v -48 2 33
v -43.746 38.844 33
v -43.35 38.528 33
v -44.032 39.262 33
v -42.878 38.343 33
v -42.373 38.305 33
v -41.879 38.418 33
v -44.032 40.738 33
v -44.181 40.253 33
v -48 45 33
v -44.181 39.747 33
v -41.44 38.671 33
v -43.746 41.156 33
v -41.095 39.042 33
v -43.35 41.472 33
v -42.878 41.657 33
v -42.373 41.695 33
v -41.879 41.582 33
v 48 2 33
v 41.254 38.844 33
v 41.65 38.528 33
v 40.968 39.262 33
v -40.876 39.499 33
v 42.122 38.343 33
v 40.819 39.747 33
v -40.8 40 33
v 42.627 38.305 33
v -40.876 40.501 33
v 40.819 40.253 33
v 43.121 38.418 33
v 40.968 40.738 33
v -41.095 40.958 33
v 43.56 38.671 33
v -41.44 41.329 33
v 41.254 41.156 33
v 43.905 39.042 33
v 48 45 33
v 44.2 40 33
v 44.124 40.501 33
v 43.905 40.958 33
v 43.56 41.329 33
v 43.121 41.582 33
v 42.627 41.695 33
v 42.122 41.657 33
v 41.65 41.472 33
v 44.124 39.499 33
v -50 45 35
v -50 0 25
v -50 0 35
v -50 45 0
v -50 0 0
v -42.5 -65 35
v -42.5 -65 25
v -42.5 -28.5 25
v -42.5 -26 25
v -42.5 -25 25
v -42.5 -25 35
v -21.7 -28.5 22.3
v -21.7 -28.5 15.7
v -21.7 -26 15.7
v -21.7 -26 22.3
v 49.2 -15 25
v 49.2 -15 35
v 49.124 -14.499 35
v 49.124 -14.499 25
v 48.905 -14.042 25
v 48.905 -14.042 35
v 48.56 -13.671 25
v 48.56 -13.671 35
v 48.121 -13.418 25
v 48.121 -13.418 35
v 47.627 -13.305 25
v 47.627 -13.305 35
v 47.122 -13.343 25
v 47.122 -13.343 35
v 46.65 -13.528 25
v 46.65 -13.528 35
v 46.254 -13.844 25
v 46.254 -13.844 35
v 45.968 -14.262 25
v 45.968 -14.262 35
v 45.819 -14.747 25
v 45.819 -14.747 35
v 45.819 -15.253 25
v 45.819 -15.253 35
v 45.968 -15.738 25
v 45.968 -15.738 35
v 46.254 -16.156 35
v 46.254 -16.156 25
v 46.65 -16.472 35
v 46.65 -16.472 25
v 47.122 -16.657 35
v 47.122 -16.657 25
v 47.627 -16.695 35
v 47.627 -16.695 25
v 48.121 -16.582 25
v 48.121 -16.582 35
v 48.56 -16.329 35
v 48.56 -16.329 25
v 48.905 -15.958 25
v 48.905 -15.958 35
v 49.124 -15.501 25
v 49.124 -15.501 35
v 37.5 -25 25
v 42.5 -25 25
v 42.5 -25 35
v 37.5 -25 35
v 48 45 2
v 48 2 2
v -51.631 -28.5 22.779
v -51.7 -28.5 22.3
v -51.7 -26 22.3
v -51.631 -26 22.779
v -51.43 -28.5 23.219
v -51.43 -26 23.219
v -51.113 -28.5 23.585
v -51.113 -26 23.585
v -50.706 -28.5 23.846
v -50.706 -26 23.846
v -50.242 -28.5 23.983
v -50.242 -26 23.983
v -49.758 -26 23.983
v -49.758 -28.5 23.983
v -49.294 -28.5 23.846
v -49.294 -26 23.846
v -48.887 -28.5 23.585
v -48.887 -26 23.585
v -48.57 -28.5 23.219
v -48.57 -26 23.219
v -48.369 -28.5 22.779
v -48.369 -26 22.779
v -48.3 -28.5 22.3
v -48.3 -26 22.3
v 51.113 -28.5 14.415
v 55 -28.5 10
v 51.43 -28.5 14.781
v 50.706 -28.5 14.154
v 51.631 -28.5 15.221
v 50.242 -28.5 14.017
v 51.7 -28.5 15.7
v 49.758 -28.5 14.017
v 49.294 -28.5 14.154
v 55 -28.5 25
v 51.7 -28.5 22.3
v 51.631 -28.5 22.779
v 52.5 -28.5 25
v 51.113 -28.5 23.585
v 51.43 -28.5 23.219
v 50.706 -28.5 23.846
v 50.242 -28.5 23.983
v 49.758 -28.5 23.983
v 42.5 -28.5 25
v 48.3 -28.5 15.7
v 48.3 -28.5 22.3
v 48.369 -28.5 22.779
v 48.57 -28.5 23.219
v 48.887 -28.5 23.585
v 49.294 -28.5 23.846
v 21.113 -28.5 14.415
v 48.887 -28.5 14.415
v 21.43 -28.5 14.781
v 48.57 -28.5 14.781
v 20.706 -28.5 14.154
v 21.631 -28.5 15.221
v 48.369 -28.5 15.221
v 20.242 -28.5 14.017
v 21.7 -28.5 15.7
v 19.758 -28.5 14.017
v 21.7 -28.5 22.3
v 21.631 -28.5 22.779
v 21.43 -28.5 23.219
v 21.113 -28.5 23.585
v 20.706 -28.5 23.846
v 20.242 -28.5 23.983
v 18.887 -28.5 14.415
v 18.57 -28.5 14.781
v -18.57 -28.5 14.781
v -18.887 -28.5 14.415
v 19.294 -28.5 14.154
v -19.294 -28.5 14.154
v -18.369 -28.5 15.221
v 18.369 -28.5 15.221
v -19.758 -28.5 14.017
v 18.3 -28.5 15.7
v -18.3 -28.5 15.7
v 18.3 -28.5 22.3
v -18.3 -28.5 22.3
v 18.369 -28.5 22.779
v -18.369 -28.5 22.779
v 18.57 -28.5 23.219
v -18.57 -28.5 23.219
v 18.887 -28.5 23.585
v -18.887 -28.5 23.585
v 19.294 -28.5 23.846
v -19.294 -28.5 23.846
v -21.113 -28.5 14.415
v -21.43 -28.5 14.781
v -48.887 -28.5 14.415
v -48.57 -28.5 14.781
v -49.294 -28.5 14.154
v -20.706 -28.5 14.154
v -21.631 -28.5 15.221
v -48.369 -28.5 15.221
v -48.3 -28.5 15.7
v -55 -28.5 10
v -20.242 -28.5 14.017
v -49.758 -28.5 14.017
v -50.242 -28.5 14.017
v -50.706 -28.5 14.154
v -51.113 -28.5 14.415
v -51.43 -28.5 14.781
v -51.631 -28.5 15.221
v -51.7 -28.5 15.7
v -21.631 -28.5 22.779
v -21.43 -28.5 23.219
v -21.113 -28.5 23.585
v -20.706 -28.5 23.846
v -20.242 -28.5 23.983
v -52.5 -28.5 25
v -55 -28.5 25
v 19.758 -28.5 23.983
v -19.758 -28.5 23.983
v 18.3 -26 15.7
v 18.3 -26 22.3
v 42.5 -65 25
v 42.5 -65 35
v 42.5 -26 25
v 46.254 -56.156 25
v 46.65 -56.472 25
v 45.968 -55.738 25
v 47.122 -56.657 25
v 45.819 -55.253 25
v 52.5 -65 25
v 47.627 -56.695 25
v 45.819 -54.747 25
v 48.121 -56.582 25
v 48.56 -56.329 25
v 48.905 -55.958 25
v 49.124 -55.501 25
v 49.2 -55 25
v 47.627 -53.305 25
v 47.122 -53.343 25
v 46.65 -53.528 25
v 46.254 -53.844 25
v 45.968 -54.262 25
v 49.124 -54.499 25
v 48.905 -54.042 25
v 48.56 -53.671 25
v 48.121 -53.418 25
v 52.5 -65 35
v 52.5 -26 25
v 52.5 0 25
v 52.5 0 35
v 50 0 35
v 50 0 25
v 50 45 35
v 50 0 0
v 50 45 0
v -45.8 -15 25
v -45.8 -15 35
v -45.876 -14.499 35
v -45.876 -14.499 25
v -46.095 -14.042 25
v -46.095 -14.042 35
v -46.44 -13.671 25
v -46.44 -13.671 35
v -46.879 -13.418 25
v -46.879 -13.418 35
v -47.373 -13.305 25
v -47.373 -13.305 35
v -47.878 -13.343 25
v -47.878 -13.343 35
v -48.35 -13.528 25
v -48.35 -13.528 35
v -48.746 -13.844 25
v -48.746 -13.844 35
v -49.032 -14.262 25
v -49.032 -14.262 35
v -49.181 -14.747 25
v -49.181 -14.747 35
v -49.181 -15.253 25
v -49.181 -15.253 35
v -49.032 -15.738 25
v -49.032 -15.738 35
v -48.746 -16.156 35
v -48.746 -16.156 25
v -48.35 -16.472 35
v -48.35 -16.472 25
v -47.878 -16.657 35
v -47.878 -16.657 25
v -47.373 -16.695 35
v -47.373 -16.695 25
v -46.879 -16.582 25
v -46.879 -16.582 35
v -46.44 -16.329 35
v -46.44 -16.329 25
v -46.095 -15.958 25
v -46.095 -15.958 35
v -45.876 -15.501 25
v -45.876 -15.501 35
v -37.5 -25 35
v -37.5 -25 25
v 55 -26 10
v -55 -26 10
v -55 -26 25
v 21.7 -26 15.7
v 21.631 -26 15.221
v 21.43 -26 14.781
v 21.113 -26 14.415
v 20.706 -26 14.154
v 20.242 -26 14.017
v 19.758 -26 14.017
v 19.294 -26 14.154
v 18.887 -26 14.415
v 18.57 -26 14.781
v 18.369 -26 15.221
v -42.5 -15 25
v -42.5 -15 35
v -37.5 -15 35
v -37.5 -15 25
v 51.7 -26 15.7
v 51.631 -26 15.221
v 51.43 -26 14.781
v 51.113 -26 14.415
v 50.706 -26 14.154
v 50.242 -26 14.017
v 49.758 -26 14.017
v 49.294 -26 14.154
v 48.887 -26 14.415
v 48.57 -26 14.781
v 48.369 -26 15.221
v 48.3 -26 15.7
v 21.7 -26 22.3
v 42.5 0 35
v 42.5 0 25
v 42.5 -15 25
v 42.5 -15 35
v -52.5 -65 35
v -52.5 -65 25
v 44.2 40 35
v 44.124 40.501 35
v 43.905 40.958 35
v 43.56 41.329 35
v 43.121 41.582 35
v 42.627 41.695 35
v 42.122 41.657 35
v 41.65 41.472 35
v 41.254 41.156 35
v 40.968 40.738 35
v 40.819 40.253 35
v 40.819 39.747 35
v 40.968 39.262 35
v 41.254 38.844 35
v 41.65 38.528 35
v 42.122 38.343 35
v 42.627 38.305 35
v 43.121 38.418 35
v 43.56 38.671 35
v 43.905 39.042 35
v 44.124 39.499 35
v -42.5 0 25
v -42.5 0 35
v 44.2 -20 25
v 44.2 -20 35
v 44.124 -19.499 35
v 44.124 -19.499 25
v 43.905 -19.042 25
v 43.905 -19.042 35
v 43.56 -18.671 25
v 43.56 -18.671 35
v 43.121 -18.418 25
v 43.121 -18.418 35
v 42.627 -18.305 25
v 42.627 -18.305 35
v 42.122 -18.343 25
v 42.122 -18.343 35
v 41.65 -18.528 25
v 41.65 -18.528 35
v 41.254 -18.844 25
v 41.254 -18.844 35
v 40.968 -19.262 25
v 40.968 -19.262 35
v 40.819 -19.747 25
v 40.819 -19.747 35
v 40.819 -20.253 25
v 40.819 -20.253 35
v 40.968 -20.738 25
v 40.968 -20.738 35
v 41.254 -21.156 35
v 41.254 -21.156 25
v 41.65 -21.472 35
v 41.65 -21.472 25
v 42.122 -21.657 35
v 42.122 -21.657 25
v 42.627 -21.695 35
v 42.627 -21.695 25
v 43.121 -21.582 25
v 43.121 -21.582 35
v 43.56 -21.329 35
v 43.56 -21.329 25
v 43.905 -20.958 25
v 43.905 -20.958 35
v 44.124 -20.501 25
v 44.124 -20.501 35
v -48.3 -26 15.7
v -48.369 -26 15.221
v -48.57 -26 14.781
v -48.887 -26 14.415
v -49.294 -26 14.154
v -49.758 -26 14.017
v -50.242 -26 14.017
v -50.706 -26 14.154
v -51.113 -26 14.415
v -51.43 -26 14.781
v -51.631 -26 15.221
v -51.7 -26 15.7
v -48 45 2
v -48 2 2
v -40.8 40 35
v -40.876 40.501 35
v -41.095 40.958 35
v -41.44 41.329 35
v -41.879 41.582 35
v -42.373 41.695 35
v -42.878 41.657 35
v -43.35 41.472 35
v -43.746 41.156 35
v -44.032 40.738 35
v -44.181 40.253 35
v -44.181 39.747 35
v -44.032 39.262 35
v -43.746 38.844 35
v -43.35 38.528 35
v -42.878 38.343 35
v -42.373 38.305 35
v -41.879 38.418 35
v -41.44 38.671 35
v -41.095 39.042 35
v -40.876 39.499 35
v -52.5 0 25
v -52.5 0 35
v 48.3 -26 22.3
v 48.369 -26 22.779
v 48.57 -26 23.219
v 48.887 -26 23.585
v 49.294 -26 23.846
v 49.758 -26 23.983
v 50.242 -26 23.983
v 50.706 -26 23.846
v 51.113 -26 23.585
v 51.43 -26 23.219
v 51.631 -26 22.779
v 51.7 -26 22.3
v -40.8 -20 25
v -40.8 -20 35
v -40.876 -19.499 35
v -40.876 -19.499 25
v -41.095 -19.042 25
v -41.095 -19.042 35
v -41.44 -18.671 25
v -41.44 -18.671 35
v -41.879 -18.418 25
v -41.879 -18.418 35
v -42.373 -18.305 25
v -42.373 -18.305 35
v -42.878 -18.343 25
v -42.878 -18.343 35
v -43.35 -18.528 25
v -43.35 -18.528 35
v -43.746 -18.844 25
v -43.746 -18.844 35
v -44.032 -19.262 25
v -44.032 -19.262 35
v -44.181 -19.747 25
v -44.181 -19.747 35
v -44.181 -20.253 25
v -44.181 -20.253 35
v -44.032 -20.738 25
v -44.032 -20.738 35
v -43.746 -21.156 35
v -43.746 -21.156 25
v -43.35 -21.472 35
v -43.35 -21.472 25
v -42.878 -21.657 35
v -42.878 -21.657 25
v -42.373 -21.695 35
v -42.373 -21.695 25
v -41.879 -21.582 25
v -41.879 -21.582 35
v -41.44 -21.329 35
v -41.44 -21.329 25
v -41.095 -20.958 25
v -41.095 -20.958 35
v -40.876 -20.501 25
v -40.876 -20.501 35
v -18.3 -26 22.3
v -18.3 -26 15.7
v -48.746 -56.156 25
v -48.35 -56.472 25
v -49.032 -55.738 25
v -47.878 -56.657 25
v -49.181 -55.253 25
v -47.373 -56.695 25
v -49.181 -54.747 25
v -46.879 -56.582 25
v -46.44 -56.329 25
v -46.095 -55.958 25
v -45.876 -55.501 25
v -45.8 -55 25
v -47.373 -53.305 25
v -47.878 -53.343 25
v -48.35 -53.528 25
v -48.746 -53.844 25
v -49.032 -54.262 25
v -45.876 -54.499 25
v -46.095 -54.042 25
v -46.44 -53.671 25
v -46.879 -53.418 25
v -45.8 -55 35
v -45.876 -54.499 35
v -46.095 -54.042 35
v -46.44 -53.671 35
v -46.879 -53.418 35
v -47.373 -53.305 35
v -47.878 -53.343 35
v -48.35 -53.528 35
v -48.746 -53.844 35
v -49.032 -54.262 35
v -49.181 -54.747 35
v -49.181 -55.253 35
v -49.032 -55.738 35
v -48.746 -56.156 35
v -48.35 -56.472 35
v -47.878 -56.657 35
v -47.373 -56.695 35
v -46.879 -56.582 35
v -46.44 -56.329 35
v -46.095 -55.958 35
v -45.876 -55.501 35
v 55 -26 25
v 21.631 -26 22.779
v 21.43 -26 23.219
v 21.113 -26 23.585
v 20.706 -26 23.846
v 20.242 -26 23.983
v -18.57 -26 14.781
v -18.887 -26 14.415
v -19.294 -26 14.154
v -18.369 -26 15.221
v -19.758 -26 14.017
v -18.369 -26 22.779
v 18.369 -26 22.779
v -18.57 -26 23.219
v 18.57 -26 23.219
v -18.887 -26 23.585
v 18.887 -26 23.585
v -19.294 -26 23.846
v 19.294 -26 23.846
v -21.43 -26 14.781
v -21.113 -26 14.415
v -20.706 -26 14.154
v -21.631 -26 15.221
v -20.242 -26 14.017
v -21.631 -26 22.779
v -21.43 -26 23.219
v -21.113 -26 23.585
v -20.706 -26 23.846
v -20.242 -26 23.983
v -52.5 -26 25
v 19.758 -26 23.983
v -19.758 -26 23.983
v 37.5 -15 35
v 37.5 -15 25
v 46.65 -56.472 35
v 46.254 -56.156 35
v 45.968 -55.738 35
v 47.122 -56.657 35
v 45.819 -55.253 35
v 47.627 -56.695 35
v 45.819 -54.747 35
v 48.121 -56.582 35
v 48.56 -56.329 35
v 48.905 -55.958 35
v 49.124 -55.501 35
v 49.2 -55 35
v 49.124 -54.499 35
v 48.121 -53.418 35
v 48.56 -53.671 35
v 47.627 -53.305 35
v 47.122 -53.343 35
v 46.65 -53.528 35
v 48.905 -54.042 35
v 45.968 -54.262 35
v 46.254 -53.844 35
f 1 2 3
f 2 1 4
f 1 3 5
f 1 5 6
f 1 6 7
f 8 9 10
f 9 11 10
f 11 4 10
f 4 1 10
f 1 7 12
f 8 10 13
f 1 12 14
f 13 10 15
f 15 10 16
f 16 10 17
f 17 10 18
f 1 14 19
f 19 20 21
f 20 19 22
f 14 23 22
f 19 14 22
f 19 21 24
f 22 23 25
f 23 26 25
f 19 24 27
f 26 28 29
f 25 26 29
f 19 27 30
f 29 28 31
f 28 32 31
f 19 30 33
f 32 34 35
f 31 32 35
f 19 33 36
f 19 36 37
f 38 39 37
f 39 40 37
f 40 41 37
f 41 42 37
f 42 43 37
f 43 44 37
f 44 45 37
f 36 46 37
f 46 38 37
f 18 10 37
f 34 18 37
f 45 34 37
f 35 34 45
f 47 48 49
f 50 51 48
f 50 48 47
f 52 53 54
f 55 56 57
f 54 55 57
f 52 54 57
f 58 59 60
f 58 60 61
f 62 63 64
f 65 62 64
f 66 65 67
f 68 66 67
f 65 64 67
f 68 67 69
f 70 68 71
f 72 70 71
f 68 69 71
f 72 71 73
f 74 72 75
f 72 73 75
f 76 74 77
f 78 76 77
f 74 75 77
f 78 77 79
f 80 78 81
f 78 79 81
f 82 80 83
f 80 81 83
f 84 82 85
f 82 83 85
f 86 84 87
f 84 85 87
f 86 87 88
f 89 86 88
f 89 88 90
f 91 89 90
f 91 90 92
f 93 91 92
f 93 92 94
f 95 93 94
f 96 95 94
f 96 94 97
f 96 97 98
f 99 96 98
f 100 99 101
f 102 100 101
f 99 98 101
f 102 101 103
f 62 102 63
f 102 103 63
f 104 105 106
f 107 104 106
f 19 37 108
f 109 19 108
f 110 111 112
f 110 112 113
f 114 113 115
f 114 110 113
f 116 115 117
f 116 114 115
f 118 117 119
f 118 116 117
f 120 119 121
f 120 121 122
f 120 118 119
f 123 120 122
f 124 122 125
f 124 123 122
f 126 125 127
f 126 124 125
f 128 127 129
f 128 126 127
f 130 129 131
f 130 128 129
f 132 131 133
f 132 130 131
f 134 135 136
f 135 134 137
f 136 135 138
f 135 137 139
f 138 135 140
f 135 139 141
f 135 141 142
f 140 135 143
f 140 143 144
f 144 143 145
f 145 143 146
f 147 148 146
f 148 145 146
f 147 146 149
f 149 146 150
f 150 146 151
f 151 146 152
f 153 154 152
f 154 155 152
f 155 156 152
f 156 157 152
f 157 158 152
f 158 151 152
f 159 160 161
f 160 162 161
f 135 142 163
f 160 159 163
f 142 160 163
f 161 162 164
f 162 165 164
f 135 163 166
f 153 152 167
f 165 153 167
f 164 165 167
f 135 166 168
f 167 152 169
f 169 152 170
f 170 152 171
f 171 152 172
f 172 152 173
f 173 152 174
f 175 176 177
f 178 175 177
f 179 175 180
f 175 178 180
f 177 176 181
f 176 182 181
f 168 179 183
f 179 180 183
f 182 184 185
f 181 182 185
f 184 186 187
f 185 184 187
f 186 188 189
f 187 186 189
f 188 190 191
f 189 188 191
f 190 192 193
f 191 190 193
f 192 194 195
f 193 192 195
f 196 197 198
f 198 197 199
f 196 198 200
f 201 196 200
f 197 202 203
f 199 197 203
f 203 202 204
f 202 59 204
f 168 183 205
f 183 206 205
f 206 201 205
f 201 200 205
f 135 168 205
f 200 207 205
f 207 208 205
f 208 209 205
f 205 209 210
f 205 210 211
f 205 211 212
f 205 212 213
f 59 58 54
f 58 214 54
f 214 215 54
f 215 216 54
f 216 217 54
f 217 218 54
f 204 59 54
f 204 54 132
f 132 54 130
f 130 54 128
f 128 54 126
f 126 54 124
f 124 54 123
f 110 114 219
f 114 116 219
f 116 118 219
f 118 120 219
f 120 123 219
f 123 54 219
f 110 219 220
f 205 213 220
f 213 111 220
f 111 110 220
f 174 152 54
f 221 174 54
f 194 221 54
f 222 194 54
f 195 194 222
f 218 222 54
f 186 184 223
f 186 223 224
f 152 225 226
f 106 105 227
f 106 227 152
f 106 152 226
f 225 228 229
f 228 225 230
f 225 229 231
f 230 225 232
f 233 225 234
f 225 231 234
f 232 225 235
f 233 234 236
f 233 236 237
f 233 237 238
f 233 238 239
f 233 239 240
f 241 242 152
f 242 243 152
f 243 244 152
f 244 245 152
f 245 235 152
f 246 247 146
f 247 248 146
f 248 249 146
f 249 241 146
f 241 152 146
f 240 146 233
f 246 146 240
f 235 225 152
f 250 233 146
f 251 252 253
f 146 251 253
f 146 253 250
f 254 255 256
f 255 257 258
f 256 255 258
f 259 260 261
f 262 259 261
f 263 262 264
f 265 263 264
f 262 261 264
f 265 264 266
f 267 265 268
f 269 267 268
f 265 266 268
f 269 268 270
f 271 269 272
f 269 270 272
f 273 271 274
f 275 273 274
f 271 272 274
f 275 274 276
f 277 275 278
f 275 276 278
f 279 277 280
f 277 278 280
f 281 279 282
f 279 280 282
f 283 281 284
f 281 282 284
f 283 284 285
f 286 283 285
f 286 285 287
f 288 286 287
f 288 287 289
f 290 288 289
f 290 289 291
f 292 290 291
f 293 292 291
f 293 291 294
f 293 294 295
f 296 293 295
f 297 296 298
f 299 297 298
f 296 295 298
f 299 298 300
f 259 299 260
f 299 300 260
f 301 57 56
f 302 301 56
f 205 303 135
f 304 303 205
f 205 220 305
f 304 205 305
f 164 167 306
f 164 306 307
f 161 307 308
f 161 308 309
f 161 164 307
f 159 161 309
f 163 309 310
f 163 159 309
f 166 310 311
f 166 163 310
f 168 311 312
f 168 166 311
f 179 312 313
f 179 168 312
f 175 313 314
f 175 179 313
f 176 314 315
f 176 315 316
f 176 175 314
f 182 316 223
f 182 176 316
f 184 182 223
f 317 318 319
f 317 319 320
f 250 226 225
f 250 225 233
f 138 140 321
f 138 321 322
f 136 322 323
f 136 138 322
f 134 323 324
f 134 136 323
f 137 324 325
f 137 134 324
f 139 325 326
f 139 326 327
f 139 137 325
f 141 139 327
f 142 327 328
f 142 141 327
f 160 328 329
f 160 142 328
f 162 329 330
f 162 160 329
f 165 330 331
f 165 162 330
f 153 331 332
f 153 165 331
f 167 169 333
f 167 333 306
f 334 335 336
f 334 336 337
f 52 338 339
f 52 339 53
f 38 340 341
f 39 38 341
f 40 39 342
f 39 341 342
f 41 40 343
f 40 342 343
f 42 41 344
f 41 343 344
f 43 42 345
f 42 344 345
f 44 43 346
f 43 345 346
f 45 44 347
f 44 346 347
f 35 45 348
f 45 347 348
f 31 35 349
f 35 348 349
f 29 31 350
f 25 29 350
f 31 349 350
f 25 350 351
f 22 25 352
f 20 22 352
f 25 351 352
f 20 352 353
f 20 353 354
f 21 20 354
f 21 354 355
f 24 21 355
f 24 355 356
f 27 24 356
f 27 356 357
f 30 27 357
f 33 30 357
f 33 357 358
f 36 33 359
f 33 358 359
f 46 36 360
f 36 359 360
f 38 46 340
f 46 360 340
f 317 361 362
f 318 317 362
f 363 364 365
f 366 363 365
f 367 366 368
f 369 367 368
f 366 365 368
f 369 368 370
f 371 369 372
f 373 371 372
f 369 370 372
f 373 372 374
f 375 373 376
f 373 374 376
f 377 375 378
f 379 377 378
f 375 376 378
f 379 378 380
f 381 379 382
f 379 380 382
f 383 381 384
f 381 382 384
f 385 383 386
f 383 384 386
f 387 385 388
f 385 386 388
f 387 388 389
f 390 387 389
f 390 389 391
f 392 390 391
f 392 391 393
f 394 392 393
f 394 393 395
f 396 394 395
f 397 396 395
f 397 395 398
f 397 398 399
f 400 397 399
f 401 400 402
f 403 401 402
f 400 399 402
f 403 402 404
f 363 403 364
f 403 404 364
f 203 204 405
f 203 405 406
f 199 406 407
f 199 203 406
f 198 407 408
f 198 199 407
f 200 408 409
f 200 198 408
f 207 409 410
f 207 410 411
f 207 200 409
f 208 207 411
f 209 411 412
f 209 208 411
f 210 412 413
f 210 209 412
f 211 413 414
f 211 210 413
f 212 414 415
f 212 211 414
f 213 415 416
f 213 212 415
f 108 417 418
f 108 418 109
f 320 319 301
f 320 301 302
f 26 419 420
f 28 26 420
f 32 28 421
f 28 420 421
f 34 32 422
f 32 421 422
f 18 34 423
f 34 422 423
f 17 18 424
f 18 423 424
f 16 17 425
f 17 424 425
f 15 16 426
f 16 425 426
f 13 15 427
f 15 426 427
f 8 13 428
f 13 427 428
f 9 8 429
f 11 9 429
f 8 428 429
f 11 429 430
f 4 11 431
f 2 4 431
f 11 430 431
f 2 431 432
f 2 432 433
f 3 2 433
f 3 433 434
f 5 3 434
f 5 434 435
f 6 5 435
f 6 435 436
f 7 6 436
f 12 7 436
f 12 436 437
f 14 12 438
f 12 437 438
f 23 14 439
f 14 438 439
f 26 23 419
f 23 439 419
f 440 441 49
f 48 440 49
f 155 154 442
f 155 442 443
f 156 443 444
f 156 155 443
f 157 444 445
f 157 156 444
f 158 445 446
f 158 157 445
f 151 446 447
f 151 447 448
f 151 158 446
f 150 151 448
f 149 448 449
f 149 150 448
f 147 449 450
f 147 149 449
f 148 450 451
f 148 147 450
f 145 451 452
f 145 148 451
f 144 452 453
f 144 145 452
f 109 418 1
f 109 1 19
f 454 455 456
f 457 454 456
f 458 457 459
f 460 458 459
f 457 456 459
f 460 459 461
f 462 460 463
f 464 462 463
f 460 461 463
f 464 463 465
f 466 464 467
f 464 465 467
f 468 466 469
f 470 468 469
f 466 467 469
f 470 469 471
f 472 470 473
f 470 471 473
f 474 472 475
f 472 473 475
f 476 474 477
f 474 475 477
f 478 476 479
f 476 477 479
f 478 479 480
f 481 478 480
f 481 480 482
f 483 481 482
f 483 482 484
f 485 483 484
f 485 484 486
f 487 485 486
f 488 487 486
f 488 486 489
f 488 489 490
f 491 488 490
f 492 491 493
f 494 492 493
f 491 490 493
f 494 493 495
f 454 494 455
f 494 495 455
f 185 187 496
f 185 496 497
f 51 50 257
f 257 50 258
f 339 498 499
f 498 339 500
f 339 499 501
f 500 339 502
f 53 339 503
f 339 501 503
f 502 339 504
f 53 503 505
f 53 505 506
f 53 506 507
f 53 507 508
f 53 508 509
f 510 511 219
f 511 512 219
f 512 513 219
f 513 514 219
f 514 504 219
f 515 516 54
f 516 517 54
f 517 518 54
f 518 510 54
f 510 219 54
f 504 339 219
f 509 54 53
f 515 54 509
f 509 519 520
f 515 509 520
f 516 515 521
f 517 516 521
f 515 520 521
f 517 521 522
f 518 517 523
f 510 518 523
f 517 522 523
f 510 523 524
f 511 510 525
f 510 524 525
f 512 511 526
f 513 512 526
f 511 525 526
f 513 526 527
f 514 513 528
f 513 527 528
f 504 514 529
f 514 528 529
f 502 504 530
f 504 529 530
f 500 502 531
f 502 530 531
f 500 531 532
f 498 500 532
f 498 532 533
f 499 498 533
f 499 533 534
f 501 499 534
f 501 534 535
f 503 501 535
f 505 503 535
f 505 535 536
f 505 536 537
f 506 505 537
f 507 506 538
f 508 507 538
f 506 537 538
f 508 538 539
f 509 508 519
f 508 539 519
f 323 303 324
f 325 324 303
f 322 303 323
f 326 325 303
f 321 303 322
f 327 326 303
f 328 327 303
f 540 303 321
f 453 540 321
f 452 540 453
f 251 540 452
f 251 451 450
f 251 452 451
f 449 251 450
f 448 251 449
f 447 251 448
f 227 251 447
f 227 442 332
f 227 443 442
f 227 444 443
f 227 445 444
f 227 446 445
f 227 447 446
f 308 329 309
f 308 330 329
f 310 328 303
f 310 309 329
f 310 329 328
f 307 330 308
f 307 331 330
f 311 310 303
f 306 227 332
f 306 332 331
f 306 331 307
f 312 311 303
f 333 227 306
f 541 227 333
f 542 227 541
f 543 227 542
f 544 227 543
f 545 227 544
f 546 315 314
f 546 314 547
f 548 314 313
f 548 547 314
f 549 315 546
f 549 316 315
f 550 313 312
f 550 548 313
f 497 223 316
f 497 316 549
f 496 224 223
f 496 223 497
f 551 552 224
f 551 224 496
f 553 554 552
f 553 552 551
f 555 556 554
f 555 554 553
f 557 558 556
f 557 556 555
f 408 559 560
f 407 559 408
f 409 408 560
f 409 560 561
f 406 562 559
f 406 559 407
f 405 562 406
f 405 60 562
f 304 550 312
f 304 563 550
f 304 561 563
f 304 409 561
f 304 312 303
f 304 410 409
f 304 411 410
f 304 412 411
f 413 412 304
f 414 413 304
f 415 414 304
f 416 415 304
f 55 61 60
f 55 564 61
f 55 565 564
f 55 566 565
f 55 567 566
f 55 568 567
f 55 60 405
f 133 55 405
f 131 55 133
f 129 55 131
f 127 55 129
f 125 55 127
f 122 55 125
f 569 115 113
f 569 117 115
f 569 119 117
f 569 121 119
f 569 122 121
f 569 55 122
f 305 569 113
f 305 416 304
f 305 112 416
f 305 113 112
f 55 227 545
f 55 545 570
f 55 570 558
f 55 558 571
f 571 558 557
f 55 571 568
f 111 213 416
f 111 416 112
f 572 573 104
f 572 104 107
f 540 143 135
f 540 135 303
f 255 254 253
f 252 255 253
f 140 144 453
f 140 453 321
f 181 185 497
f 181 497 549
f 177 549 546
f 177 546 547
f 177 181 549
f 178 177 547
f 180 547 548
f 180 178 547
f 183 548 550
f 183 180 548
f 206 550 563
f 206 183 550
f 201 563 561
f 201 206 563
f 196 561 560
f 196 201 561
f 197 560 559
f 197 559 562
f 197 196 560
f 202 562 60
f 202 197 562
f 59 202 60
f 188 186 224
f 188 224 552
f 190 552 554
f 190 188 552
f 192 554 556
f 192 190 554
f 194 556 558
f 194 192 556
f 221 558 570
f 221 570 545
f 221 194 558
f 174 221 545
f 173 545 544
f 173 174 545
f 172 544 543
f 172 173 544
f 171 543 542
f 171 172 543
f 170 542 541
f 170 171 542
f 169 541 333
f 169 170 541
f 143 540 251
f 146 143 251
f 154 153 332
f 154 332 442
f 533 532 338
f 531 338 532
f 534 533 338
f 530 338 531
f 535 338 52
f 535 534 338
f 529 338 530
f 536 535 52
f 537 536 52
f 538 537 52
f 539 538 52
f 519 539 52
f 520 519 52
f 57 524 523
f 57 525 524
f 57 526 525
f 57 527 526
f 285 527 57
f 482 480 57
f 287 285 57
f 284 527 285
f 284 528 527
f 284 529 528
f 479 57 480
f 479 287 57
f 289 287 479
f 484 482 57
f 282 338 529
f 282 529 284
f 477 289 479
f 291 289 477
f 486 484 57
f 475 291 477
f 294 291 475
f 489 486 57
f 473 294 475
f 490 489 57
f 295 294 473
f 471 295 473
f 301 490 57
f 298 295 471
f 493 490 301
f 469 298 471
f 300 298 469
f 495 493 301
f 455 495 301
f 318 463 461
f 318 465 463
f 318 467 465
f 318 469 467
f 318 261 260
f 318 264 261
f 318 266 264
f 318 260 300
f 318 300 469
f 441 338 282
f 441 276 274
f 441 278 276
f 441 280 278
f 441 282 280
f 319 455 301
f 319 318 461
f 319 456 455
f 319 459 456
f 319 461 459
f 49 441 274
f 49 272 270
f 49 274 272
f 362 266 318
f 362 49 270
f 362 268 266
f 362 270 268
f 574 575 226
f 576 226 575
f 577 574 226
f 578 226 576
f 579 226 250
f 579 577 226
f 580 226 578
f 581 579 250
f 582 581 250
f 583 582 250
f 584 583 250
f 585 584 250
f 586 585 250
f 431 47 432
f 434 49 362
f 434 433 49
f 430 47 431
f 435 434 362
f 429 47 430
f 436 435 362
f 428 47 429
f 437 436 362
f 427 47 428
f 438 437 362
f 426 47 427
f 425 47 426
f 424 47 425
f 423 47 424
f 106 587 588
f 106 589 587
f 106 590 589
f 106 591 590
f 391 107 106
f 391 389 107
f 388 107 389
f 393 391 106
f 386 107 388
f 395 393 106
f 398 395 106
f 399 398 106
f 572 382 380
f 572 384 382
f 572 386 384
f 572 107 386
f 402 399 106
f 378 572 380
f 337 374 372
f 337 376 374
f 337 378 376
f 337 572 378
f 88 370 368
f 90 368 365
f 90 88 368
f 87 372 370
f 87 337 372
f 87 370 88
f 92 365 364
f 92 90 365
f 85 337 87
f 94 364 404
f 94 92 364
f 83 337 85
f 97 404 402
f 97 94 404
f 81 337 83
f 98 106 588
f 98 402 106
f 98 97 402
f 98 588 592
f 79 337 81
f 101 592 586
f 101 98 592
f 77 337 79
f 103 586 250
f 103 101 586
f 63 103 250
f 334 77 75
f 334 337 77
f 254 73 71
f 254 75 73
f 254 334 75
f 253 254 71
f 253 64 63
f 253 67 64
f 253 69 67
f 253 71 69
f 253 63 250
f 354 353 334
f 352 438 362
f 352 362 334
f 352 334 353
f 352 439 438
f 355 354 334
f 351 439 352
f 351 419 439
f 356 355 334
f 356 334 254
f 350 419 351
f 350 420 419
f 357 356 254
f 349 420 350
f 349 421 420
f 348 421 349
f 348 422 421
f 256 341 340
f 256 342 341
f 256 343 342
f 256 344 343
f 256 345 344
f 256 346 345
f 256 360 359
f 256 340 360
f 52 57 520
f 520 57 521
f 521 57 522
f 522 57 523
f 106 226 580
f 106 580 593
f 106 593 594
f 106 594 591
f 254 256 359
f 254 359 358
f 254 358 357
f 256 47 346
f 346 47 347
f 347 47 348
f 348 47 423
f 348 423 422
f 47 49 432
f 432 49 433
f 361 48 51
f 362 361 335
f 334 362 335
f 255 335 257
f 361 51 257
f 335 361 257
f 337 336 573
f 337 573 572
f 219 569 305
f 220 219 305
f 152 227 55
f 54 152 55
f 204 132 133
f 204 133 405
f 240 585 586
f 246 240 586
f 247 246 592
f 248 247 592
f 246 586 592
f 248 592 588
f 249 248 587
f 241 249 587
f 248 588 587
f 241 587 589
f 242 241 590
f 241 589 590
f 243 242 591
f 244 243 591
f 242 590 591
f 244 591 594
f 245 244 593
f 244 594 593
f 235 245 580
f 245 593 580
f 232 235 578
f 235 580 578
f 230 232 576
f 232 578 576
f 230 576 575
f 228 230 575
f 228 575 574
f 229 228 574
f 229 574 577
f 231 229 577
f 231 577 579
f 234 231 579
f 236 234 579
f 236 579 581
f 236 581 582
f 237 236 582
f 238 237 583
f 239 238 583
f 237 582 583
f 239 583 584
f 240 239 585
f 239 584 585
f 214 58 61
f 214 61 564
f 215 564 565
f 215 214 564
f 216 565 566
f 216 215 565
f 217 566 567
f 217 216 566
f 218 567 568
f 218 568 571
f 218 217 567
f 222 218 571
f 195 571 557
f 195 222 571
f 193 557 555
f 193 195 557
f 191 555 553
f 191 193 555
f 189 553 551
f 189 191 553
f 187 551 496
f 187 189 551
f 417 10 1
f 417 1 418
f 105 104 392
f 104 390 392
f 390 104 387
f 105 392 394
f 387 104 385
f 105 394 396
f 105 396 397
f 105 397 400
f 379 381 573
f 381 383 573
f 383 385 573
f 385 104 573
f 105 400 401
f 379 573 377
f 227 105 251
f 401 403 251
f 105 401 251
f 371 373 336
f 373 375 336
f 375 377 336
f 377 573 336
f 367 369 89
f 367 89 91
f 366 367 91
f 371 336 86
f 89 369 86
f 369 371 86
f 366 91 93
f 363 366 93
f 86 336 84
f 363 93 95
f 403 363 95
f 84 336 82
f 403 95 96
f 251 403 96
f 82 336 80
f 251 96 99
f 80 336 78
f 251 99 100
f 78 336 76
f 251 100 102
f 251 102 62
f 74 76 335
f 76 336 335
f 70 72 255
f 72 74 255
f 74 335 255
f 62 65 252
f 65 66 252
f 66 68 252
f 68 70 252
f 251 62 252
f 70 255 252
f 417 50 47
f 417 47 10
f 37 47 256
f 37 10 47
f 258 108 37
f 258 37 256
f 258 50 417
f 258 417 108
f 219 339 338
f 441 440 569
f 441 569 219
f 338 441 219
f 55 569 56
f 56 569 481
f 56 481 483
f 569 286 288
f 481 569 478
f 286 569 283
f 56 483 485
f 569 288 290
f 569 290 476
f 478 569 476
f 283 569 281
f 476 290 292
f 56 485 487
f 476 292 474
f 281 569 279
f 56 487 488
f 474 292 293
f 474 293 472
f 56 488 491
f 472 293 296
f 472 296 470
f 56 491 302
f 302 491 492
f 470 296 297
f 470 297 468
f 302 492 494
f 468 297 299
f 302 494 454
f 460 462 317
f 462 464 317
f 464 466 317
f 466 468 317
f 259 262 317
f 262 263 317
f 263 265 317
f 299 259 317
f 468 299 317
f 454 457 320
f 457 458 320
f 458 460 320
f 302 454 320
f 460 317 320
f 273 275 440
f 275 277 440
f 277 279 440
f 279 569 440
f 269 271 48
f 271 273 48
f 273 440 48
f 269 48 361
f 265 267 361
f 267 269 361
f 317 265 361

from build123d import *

# Parameters (mm, degrees)
V3_BOX_FOOTPRINT_100_X_45_MM_W                 = 100
V3_BOX_FOOTPRINT_100_X_45_MM_H                 = 45
V3_BOX_HEIGHT_35_MM_DEPTH                      = 35
V3_REAR_OPENING_96_X_31_MM_W                   = 96
V3_REAR_OPENING_96_X_31_MM_H                   = 31
V3_CAVITY_ALL_WALLS_2_MM_DEPTH                 = 43
V3_SQUARE_BEAMS_10_X_10_PITCH_95_MM_W          = 10
V3_SQUARE_BEAMS_10_X_10_PITCH_95_MM_H          = 10
V3_FORWARD_BEAM_LENGTH_65_MM_DEPTH             = 65
V3_LEFT_PCB_EAR_PROFILE_W                      = 10
V3_LEFT_PCB_EAR_PROFILE_H                      = 10
V3_LEFT_INWARD_EAR_5_MM_DEPTH                  = 5
V3_RIGHT_PCB_EAR_PROFILE_W                     = 10
V3_RIGHT_PCB_EAR_PROFILE_H                     = 10
V3_RIGHT_INWARD_EAR_5_MM_DEPTH                 = 5
V3_PCB_ROOF_PAIR_PITCH_85_MM_R                 = 1.7
V3_M3_ROOF_HOLES_DIAMETER_3_4_MM_DEPTH         = 2
V3_PCB_FORWARD_PAIR_ROW_SPACING_60_MM_R        = 1.7
V3_M3_PCB_EAR_HOLES_DEPTH                      = 10
V3_CHASSIS_TOP_HOLES_WIDTH_95_DEPTH_40_M_R     = 1.7
V3_M3_BEAM_TOP_BOTTOM_HOLES_DEPTH              = 10
V3_HANGING_PLATE_OFFSET_26_THICKNESS_2_5_W     = 110
V3_HANGING_PLATE_OFFSET_26_THICKNESS_2_5_H     = 2.5
V3_MOUNTING_PLATE_DOWNWARD_15_MM_WIDTH_1_DEPTH = 15
V3_FOUR_MOUNTING_SLOTS_3_4_X_10_MM_DEPTH       = 2.5


with BuildPart() as part:
    # V3 box footprint 100 x 45 mm → V3 box height 35 mm (new body)
    with BuildSketch(Plane.XY):
        with Locations((0, 22.5)):
            Rectangle(V3_BOX_FOOTPRINT_100_X_45_MM_W, V3_BOX_FOOTPRINT_100_X_45_MM_H)
    extrude(amount=V3_BOX_HEIGHT_35_MM_DEPTH)

    # V3 rear opening 96 x 31 mm → V3 cavity all walls 2 mm (cut)
    with BuildSketch(Plane(origin=(0, 45, 0), x_dir=(1, 0, 0), z_dir=(0, 1, 0))):
        with Locations((0, -17.5)):
            Rectangle(V3_REAR_OPENING_96_X_31_MM_W, V3_REAR_OPENING_96_X_31_MM_H)
    extrude(amount=-V3_CAVITY_ALL_WALLS_2_MM_DEPTH, mode=Mode.SUBTRACT)

    # V3 square beams 10 x 10 pitch 95 mm → V3 forward beam length 65 mm (add)
    with BuildSketch(Plane.XZ):
        with Locations((-47.5, 30)):
            Rectangle(V3_SQUARE_BEAMS_10_X_10_PITCH_95_MM_W, V3_SQUARE_BEAMS_10_X_10_PITCH_95_MM_H)
        with Locations((47.5, 30)):
            Rectangle(V3_SQUARE_BEAMS_10_X_10_PITCH_95_MM_W, V3_SQUARE_BEAMS_10_X_10_PITCH_95_MM_H)
    extrude(amount=V3_FORWARD_BEAM_LENGTH_65_MM_DEPTH)

    # V3 left PCB ear profile → V3 left inward ear 5 mm (add)
    with BuildSketch(Plane(origin=(-42.5, 0, 0), x_dir=(0, 0, -1), z_dir=(1, 0, 0))):
        with Locations((-30, -20)):
            Rectangle(V3_LEFT_PCB_EAR_PROFILE_W, V3_LEFT_PCB_EAR_PROFILE_H)
    extrude(amount=V3_LEFT_INWARD_EAR_5_MM_DEPTH)

    # V3 right PCB ear profile → V3 right inward ear 5 mm (add)
    with BuildSketch(Plane.ZY.offset(-42.5)):
        with Locations((30, -20)):
            Rectangle(V3_RIGHT_PCB_EAR_PROFILE_W, V3_RIGHT_PCB_EAR_PROFILE_H)
    extrude(amount=V3_RIGHT_INWARD_EAR_5_MM_DEPTH)

    # V3 PCB roof pair pitch 85 mm → V3 M3 roof holes diameter 3.4 mm (cut)
    with BuildSketch(Plane.XY.offset(35)):
        with Locations((-42.5, 40)):
            Circle(V3_PCB_ROOF_PAIR_PITCH_85_MM_R)
        with Locations((42.5, 40)):
            Circle(V3_PCB_ROOF_PAIR_PITCH_85_MM_R)
    extrude(amount=-V3_M3_ROOF_HOLES_DIAMETER_3_4_MM_DEPTH, mode=Mode.SUBTRACT)

    # V3 PCB forward pair row spacing 60 mm → V3 M3 PCB ear holes (cut)
    with BuildSketch(Plane.XY.offset(35)):
        with Locations((-42.5, -20)):
            Circle(V3_PCB_FORWARD_PAIR_ROW_SPACING_60_MM_R)
        with Locations((42.5, -20)):
            Circle(V3_PCB_FORWARD_PAIR_ROW_SPACING_60_MM_R)
    extrude(amount=-V3_M3_PCB_EAR_HOLES_DEPTH, mode=Mode.SUBTRACT)

    # V3 chassis top holes width 95 depth 40 mm → V3 M3 beam top bottom holes (cut)
    with BuildSketch(Plane.XY.offset(35)):
        with Locations((-47.5, -55)):
            Circle(V3_CHASSIS_TOP_HOLES_WIDTH_95_DEPTH_40_M_R)
        with Locations((-47.5, -15)):
            Circle(V3_CHASSIS_TOP_HOLES_WIDTH_95_DEPTH_40_M_R)
        with Locations((47.5, -55)):
            Circle(V3_CHASSIS_TOP_HOLES_WIDTH_95_DEPTH_40_M_R)
        with Locations((47.5, -15)):
            Circle(V3_CHASSIS_TOP_HOLES_WIDTH_95_DEPTH_40_M_R)
    extrude(amount=-V3_M3_BEAM_TOP_BOTTOM_HOLES_DEPTH, mode=Mode.SUBTRACT)

    # V3 hanging plate offset 26 thickness 2.5 mm → V3 mounting plate downward 15 mm width 110 (add)
    with BuildSketch(Plane(origin=(0, 0, 25), x_dir=(-1, 0, 0), z_dir=(0, 0, -1))):
        with Locations((0, -27.25)):
            Rectangle(V3_HANGING_PLATE_OFFSET_26_THICKNESS_2_5_W, V3_HANGING_PLATE_OFFSET_26_THICKNESS_2_5_H)
    extrude(amount=V3_MOUNTING_PLATE_DOWNWARD_15_MM_WIDTH_1_DEPTH)

    # V3 slots 6 mm below beam underside centers 20 and 50 → V3 four mounting slots 3.4 x 10 mm (cut)
    with BuildSketch(Plane.XZ.offset(28.5)):
        with BuildLine():
            Line((-51.7, 15.7), (-51.7, 22.3))
            ThreePointArc((-51.7, 22.3), (-50, 24), (-48.3, 22.3))
            Line((-48.3, 22.3), (-48.3, 15.7))
            ThreePointArc((-48.3, 15.7), (-50, 14), (-51.7, 15.7))
        make_face()
        with BuildLine():
            Line((-21.7, 15.7), (-21.7, 22.3))
            ThreePointArc((-21.7, 22.3), (-20, 24), (-18.3, 22.3))
            Line((-18.3, 22.3), (-18.3, 15.7))
            ThreePointArc((-18.3, 15.7), (-20, 14), (-21.7, 15.7))
        make_face()
        with BuildLine():
            Line((18.3, 15.7), (18.3, 22.3))
            ThreePointArc((18.3, 22.3), (20, 24), (21.7, 22.3))
            Line((21.7, 22.3), (21.7, 15.7))
            ThreePointArc((21.7, 15.7), (20, 14), (18.3, 15.7))
        make_face()
        with BuildLine():
            Line((48.3, 15.7), (48.3, 22.3))
            ThreePointArc((48.3, 22.3), (50, 24), (51.7, 22.3))
            Line((51.7, 22.3), (51.7, 15.7))
            ThreePointArc((51.7, 15.7), (50, 14), (48.3, 15.7))
        make_face()
    extrude(amount=-V3_FOUR_MOUNTING_SLOTS_3_4_X_10_MM_DEPTH, mode=Mode.SUBTRACT)


solid = part.part
